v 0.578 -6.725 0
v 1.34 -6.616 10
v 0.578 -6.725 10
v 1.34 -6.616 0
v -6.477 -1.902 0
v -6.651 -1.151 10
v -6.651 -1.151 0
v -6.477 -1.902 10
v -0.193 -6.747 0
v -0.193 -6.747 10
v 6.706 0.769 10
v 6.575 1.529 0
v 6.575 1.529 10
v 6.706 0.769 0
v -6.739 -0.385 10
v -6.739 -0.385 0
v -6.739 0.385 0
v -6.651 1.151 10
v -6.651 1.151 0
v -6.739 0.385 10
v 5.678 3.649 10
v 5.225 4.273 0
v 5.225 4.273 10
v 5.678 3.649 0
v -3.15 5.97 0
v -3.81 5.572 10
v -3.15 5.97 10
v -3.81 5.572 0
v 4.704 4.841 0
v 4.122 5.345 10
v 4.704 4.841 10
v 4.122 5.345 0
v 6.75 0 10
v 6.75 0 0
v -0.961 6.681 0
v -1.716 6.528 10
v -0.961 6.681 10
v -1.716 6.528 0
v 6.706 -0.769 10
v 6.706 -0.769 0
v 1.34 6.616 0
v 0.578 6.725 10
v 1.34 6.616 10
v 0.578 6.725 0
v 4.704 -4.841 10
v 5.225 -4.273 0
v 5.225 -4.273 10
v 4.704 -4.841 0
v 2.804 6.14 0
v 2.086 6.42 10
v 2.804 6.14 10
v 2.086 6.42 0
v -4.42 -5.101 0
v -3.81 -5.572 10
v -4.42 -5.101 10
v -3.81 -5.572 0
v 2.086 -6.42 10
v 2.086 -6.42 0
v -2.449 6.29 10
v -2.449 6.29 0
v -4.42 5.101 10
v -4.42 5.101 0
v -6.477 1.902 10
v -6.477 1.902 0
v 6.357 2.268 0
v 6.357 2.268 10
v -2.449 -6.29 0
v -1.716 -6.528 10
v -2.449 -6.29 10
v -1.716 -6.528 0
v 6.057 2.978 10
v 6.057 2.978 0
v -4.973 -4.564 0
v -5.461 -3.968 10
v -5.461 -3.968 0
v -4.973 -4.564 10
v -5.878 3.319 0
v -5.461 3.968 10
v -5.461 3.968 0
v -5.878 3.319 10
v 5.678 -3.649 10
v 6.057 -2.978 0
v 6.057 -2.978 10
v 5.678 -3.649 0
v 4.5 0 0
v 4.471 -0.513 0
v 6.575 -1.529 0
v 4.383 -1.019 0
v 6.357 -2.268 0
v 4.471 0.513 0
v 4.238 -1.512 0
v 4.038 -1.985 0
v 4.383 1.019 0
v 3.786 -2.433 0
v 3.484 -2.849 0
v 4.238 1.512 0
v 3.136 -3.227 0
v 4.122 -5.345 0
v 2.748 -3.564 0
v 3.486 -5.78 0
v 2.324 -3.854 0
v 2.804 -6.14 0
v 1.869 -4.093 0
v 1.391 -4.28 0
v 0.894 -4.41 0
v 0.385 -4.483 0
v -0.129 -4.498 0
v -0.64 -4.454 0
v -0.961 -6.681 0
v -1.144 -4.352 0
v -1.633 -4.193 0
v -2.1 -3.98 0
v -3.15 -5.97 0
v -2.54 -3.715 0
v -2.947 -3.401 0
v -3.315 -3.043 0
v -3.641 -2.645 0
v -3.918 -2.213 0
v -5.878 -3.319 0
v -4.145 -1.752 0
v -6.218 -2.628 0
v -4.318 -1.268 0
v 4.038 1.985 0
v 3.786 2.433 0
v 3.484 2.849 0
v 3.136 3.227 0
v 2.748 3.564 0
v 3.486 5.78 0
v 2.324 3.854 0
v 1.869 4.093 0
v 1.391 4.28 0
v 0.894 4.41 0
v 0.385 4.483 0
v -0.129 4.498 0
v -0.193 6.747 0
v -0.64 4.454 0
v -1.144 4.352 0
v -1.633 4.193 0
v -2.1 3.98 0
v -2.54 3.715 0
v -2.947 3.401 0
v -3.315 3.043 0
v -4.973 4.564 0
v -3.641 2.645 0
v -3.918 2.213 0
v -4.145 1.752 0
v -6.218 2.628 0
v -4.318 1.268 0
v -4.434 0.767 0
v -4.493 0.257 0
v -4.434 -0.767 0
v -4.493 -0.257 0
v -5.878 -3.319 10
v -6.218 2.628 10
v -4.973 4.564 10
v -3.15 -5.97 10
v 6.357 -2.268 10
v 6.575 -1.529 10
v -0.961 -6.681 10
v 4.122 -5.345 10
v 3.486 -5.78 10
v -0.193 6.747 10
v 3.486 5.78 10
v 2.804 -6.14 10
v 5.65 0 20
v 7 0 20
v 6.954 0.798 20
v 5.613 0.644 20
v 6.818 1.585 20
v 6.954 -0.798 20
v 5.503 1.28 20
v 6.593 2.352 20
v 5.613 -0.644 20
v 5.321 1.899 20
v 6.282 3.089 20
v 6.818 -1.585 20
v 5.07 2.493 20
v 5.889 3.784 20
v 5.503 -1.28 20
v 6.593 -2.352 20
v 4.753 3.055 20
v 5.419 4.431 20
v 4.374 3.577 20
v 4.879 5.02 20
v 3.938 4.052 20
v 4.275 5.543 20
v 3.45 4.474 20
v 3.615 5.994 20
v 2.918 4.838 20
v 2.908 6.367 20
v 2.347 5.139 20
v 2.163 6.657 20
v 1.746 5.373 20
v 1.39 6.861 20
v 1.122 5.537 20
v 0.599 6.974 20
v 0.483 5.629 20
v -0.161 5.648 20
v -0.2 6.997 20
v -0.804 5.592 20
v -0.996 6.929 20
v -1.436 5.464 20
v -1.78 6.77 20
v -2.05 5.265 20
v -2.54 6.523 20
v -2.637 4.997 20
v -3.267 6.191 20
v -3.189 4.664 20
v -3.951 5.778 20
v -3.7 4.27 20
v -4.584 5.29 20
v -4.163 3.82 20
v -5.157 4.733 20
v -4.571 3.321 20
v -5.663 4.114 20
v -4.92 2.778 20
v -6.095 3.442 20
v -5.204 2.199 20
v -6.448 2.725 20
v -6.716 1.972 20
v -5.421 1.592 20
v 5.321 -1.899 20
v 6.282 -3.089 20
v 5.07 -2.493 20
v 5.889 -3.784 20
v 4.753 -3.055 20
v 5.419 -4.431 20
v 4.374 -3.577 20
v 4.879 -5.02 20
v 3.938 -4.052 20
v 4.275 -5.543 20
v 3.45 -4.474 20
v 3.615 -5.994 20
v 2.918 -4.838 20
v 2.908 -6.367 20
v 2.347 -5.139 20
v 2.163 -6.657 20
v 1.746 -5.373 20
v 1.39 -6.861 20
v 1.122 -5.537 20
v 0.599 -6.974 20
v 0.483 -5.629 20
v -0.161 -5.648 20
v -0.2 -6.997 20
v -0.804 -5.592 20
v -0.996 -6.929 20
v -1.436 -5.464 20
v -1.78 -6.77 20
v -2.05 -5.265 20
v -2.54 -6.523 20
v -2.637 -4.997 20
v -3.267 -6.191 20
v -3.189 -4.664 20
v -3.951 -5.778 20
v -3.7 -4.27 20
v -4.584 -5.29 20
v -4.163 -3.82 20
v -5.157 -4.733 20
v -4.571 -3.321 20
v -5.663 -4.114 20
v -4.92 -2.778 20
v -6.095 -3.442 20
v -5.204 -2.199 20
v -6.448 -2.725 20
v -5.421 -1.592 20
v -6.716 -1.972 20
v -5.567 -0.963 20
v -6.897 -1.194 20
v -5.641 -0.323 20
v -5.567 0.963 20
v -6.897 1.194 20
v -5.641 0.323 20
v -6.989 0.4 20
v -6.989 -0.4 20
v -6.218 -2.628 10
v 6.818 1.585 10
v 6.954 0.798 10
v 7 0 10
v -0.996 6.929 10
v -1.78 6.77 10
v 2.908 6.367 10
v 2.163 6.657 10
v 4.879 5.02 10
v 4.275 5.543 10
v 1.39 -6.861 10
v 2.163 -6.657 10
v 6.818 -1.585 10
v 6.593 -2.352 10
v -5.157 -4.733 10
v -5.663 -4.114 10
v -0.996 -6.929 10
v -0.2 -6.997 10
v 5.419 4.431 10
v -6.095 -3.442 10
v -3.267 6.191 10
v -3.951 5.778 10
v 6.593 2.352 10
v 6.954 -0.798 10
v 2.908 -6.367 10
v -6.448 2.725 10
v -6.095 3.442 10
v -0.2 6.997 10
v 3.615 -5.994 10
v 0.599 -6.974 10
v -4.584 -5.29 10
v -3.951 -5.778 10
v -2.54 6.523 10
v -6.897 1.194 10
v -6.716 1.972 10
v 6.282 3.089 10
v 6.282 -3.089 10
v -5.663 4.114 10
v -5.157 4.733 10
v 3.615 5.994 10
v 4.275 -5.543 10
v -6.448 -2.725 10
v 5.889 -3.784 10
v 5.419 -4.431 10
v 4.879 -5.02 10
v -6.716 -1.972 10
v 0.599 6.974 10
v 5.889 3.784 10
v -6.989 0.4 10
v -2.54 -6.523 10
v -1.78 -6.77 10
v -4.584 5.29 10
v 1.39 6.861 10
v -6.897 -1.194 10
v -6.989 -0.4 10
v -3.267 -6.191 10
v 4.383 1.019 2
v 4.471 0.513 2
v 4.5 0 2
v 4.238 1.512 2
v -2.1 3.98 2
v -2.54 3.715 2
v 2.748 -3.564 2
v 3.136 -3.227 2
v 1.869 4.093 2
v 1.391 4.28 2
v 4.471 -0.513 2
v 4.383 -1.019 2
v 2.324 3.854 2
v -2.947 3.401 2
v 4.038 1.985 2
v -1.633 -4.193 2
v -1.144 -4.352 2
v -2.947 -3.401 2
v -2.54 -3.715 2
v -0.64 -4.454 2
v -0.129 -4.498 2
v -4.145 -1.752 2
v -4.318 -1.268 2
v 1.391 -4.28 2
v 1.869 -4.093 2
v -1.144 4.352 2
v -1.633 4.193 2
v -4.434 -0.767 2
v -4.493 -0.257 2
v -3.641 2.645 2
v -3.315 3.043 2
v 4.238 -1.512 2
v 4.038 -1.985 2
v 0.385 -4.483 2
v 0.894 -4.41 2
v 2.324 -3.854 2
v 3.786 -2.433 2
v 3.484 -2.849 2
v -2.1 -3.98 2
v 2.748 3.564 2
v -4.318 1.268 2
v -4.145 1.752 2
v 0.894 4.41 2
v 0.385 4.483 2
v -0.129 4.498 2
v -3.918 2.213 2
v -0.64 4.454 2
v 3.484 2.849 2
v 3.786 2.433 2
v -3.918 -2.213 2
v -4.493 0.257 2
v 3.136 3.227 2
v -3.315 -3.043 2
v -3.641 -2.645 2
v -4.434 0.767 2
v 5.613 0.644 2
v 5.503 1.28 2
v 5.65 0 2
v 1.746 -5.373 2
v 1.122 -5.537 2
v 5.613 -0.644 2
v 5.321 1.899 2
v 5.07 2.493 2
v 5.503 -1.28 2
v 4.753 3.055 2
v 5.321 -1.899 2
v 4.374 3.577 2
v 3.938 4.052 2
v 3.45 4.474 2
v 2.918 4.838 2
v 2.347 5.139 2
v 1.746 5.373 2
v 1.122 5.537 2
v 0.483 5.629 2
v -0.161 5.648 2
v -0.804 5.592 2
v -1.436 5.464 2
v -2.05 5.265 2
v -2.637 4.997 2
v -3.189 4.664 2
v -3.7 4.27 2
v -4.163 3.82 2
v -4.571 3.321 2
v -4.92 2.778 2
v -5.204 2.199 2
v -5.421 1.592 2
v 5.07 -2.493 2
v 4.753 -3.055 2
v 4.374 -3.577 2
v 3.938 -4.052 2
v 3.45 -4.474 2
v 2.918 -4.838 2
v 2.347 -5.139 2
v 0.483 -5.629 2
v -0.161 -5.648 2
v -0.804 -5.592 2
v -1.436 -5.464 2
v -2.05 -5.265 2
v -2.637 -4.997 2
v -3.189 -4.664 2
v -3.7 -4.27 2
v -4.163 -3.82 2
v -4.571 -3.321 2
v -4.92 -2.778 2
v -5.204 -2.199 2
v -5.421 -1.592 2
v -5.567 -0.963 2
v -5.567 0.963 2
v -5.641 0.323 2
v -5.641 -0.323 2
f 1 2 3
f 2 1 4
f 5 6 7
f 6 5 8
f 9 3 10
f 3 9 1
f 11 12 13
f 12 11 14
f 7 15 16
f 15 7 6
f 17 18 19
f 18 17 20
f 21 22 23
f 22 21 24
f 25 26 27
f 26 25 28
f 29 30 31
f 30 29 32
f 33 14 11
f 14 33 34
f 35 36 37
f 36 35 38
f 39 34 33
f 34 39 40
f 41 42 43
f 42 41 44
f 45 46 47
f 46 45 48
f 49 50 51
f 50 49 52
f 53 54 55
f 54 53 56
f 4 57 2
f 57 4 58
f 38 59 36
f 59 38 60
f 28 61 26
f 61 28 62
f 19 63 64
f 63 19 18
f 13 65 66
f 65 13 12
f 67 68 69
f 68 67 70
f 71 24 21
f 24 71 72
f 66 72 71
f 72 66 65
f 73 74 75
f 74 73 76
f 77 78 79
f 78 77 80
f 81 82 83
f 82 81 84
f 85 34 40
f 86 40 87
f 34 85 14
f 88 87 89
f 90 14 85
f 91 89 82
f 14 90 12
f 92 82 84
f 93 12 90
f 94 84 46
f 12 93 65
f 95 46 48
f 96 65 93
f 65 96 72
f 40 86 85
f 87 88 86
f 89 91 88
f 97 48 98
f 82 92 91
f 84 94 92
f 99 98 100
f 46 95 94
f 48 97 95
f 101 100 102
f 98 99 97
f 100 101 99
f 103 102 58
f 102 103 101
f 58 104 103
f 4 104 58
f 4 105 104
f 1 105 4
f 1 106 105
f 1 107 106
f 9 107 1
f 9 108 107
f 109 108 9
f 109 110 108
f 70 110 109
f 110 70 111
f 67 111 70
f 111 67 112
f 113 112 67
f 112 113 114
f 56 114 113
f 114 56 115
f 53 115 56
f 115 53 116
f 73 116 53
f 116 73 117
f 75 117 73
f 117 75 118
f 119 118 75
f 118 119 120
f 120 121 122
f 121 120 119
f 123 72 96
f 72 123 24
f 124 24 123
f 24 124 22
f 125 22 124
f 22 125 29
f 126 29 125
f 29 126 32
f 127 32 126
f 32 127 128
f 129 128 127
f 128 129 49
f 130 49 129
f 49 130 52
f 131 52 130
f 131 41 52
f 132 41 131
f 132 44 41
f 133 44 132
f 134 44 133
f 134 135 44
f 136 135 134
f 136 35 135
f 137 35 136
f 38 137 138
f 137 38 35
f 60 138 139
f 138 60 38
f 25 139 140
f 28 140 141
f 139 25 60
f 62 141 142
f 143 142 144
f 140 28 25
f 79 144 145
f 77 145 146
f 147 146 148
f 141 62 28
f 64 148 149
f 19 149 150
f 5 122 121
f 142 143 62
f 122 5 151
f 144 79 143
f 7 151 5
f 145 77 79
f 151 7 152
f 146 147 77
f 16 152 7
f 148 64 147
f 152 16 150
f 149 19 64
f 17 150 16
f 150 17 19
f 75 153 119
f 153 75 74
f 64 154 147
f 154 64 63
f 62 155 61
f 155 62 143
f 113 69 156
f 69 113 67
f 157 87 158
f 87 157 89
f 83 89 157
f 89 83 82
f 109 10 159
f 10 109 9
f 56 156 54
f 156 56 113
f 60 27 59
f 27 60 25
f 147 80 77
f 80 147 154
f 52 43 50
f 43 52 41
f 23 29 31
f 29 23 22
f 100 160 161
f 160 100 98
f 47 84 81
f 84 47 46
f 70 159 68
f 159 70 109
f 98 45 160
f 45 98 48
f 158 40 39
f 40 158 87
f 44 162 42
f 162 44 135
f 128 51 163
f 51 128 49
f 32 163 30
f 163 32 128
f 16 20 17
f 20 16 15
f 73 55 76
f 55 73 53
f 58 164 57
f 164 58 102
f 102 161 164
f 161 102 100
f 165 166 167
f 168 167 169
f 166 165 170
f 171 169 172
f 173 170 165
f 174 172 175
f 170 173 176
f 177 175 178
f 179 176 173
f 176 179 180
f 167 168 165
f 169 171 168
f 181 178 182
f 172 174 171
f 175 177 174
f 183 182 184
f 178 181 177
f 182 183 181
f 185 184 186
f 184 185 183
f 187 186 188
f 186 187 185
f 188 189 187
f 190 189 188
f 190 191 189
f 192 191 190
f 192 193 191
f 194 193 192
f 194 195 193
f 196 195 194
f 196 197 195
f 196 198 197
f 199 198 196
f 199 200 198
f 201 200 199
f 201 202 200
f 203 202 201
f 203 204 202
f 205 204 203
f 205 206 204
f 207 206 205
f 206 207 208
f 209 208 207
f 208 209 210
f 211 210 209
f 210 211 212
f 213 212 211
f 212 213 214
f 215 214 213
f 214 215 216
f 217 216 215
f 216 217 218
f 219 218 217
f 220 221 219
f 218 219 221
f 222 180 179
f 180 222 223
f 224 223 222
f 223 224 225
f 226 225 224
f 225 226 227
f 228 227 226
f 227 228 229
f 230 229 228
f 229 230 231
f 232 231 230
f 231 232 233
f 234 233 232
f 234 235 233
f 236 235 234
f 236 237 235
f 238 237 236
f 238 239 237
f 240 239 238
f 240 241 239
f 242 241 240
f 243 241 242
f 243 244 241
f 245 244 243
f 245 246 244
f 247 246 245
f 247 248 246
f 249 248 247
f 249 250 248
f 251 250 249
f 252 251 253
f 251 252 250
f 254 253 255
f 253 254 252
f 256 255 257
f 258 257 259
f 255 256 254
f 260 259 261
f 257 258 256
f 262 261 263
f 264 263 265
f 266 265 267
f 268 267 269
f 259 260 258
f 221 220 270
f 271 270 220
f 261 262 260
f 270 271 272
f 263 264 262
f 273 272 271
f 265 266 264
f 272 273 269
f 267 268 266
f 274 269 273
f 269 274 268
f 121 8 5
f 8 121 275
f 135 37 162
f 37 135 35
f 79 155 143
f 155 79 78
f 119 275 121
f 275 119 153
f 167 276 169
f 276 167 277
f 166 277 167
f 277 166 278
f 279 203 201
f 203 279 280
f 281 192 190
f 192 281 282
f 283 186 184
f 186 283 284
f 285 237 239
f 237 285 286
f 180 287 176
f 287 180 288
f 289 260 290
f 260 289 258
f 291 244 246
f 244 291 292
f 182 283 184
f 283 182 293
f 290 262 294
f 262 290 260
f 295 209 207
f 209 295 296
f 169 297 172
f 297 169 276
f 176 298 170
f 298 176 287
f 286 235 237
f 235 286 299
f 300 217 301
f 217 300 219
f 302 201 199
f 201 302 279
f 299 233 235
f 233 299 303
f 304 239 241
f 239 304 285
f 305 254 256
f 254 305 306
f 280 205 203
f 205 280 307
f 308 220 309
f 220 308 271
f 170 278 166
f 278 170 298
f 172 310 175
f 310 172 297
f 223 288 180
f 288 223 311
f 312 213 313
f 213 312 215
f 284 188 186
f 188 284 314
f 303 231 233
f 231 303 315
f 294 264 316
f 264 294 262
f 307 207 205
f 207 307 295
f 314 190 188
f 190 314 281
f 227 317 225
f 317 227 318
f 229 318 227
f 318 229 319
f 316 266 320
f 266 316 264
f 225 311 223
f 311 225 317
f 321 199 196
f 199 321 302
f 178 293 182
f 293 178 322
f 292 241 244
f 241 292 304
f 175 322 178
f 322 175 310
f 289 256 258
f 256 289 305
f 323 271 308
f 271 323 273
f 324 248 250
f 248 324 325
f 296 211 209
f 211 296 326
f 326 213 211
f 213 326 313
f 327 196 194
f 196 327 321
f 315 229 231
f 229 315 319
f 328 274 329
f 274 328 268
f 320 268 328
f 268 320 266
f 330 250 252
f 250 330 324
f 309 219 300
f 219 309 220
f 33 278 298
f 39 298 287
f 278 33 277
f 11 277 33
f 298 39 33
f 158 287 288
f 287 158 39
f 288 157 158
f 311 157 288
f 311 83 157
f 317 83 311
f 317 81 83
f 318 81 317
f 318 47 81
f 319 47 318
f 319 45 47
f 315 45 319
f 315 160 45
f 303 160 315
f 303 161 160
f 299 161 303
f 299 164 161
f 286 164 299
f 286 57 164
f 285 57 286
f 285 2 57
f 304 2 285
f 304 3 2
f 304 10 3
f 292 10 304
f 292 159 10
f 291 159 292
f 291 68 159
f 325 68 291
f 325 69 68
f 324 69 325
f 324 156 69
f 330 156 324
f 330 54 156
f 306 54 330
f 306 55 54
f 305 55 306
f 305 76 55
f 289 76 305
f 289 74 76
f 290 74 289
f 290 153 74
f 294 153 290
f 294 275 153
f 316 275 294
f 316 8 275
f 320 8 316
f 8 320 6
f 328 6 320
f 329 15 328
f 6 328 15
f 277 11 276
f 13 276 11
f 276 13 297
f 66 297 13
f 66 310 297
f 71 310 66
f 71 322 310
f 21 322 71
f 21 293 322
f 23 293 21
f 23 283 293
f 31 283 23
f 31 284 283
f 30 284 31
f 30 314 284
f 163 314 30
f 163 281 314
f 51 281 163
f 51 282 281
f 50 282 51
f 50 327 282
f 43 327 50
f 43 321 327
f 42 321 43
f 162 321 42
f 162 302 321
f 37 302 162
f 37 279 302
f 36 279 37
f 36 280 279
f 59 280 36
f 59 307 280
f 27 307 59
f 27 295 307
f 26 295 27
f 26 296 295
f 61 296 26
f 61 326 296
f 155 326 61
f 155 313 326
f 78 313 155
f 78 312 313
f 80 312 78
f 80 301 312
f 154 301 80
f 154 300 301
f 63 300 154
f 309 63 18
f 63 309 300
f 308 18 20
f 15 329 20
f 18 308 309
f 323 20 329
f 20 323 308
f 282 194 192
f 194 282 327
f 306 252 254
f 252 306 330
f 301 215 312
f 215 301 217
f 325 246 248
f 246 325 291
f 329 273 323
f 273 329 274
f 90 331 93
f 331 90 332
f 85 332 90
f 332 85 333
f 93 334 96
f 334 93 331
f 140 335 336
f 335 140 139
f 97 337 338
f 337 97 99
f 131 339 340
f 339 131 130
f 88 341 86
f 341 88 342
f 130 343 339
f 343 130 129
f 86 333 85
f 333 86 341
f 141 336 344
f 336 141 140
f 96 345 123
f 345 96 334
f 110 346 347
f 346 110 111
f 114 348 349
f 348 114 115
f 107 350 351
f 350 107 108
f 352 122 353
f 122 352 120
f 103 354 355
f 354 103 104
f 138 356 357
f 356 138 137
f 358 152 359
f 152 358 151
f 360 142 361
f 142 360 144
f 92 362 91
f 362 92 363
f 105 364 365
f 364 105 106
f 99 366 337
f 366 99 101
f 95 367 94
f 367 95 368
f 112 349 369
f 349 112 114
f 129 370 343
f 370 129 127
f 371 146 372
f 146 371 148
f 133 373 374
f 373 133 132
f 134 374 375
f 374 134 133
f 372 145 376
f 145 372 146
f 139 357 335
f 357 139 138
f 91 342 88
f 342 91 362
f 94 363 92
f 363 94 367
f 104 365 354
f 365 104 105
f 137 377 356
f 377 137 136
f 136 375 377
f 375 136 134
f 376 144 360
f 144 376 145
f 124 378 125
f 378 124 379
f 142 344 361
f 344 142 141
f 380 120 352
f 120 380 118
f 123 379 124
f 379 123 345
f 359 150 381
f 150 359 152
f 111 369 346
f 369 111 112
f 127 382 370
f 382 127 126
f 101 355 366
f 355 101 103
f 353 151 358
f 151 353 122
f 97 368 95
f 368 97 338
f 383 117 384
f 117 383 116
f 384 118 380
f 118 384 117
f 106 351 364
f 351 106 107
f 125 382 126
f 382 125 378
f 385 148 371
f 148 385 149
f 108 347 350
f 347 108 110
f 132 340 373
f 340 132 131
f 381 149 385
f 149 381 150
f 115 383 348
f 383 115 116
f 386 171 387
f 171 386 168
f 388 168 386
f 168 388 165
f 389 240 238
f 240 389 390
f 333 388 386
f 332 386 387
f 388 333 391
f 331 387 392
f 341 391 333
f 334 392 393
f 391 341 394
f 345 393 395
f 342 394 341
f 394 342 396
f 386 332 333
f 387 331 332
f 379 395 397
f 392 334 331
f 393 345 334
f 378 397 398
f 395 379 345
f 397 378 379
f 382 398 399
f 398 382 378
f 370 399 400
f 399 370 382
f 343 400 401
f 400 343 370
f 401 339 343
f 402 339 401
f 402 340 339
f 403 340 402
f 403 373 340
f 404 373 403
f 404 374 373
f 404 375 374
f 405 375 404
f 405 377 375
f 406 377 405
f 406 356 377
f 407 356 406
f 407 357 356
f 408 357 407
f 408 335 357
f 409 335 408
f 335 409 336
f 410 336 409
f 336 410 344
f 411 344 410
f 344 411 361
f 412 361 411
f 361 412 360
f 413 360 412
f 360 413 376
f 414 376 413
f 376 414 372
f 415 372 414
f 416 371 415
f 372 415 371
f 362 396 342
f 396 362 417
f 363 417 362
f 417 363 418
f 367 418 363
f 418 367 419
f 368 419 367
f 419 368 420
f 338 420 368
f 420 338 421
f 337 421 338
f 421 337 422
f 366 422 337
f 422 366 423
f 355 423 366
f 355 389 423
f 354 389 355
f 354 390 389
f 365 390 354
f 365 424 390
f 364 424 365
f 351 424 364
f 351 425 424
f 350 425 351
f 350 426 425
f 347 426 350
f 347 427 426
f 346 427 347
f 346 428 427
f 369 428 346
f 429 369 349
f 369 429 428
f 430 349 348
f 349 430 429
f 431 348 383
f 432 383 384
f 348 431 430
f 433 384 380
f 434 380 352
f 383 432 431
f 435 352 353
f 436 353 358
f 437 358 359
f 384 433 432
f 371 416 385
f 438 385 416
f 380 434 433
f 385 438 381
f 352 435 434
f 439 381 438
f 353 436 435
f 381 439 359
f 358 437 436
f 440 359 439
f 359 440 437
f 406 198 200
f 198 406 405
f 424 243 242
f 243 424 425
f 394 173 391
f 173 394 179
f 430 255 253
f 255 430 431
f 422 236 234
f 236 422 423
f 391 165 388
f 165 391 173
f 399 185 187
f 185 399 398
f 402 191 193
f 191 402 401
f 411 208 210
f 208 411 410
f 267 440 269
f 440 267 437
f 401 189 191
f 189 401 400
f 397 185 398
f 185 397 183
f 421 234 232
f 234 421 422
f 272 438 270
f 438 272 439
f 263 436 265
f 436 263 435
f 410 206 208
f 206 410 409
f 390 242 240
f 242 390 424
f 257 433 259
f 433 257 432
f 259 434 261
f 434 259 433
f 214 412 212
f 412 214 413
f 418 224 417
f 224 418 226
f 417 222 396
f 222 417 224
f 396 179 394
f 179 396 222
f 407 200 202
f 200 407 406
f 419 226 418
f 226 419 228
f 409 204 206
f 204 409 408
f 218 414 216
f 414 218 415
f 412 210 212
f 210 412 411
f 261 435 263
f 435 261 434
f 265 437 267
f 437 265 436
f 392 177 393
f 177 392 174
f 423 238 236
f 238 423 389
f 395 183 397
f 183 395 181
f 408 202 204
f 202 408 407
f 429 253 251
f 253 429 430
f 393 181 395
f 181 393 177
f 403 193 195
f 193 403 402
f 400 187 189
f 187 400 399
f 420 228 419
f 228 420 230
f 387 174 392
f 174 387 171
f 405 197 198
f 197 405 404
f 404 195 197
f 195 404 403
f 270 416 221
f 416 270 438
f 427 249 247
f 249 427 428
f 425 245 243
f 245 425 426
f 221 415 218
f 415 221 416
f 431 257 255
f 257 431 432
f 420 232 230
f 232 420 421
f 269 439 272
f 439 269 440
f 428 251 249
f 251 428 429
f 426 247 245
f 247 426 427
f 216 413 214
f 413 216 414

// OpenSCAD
barrel = 11.3 /2;
barrel_c = 9 /2;
$fn = 55;
//$fs = .01;

difference()
{
    union()
    {
        cylinder(h=20, r=13.5 / 2, center=false);  // inside diameter of the tube
        translate([0,0,10]) cylinder(h=10, r=14 /2, center=false);
    }
    cylinder(h=20, r=barrel_c, center=false);  // stopper
    translate([0,0,2]) cylinder(h=20, r=barrel, center=false); // barrel
}
